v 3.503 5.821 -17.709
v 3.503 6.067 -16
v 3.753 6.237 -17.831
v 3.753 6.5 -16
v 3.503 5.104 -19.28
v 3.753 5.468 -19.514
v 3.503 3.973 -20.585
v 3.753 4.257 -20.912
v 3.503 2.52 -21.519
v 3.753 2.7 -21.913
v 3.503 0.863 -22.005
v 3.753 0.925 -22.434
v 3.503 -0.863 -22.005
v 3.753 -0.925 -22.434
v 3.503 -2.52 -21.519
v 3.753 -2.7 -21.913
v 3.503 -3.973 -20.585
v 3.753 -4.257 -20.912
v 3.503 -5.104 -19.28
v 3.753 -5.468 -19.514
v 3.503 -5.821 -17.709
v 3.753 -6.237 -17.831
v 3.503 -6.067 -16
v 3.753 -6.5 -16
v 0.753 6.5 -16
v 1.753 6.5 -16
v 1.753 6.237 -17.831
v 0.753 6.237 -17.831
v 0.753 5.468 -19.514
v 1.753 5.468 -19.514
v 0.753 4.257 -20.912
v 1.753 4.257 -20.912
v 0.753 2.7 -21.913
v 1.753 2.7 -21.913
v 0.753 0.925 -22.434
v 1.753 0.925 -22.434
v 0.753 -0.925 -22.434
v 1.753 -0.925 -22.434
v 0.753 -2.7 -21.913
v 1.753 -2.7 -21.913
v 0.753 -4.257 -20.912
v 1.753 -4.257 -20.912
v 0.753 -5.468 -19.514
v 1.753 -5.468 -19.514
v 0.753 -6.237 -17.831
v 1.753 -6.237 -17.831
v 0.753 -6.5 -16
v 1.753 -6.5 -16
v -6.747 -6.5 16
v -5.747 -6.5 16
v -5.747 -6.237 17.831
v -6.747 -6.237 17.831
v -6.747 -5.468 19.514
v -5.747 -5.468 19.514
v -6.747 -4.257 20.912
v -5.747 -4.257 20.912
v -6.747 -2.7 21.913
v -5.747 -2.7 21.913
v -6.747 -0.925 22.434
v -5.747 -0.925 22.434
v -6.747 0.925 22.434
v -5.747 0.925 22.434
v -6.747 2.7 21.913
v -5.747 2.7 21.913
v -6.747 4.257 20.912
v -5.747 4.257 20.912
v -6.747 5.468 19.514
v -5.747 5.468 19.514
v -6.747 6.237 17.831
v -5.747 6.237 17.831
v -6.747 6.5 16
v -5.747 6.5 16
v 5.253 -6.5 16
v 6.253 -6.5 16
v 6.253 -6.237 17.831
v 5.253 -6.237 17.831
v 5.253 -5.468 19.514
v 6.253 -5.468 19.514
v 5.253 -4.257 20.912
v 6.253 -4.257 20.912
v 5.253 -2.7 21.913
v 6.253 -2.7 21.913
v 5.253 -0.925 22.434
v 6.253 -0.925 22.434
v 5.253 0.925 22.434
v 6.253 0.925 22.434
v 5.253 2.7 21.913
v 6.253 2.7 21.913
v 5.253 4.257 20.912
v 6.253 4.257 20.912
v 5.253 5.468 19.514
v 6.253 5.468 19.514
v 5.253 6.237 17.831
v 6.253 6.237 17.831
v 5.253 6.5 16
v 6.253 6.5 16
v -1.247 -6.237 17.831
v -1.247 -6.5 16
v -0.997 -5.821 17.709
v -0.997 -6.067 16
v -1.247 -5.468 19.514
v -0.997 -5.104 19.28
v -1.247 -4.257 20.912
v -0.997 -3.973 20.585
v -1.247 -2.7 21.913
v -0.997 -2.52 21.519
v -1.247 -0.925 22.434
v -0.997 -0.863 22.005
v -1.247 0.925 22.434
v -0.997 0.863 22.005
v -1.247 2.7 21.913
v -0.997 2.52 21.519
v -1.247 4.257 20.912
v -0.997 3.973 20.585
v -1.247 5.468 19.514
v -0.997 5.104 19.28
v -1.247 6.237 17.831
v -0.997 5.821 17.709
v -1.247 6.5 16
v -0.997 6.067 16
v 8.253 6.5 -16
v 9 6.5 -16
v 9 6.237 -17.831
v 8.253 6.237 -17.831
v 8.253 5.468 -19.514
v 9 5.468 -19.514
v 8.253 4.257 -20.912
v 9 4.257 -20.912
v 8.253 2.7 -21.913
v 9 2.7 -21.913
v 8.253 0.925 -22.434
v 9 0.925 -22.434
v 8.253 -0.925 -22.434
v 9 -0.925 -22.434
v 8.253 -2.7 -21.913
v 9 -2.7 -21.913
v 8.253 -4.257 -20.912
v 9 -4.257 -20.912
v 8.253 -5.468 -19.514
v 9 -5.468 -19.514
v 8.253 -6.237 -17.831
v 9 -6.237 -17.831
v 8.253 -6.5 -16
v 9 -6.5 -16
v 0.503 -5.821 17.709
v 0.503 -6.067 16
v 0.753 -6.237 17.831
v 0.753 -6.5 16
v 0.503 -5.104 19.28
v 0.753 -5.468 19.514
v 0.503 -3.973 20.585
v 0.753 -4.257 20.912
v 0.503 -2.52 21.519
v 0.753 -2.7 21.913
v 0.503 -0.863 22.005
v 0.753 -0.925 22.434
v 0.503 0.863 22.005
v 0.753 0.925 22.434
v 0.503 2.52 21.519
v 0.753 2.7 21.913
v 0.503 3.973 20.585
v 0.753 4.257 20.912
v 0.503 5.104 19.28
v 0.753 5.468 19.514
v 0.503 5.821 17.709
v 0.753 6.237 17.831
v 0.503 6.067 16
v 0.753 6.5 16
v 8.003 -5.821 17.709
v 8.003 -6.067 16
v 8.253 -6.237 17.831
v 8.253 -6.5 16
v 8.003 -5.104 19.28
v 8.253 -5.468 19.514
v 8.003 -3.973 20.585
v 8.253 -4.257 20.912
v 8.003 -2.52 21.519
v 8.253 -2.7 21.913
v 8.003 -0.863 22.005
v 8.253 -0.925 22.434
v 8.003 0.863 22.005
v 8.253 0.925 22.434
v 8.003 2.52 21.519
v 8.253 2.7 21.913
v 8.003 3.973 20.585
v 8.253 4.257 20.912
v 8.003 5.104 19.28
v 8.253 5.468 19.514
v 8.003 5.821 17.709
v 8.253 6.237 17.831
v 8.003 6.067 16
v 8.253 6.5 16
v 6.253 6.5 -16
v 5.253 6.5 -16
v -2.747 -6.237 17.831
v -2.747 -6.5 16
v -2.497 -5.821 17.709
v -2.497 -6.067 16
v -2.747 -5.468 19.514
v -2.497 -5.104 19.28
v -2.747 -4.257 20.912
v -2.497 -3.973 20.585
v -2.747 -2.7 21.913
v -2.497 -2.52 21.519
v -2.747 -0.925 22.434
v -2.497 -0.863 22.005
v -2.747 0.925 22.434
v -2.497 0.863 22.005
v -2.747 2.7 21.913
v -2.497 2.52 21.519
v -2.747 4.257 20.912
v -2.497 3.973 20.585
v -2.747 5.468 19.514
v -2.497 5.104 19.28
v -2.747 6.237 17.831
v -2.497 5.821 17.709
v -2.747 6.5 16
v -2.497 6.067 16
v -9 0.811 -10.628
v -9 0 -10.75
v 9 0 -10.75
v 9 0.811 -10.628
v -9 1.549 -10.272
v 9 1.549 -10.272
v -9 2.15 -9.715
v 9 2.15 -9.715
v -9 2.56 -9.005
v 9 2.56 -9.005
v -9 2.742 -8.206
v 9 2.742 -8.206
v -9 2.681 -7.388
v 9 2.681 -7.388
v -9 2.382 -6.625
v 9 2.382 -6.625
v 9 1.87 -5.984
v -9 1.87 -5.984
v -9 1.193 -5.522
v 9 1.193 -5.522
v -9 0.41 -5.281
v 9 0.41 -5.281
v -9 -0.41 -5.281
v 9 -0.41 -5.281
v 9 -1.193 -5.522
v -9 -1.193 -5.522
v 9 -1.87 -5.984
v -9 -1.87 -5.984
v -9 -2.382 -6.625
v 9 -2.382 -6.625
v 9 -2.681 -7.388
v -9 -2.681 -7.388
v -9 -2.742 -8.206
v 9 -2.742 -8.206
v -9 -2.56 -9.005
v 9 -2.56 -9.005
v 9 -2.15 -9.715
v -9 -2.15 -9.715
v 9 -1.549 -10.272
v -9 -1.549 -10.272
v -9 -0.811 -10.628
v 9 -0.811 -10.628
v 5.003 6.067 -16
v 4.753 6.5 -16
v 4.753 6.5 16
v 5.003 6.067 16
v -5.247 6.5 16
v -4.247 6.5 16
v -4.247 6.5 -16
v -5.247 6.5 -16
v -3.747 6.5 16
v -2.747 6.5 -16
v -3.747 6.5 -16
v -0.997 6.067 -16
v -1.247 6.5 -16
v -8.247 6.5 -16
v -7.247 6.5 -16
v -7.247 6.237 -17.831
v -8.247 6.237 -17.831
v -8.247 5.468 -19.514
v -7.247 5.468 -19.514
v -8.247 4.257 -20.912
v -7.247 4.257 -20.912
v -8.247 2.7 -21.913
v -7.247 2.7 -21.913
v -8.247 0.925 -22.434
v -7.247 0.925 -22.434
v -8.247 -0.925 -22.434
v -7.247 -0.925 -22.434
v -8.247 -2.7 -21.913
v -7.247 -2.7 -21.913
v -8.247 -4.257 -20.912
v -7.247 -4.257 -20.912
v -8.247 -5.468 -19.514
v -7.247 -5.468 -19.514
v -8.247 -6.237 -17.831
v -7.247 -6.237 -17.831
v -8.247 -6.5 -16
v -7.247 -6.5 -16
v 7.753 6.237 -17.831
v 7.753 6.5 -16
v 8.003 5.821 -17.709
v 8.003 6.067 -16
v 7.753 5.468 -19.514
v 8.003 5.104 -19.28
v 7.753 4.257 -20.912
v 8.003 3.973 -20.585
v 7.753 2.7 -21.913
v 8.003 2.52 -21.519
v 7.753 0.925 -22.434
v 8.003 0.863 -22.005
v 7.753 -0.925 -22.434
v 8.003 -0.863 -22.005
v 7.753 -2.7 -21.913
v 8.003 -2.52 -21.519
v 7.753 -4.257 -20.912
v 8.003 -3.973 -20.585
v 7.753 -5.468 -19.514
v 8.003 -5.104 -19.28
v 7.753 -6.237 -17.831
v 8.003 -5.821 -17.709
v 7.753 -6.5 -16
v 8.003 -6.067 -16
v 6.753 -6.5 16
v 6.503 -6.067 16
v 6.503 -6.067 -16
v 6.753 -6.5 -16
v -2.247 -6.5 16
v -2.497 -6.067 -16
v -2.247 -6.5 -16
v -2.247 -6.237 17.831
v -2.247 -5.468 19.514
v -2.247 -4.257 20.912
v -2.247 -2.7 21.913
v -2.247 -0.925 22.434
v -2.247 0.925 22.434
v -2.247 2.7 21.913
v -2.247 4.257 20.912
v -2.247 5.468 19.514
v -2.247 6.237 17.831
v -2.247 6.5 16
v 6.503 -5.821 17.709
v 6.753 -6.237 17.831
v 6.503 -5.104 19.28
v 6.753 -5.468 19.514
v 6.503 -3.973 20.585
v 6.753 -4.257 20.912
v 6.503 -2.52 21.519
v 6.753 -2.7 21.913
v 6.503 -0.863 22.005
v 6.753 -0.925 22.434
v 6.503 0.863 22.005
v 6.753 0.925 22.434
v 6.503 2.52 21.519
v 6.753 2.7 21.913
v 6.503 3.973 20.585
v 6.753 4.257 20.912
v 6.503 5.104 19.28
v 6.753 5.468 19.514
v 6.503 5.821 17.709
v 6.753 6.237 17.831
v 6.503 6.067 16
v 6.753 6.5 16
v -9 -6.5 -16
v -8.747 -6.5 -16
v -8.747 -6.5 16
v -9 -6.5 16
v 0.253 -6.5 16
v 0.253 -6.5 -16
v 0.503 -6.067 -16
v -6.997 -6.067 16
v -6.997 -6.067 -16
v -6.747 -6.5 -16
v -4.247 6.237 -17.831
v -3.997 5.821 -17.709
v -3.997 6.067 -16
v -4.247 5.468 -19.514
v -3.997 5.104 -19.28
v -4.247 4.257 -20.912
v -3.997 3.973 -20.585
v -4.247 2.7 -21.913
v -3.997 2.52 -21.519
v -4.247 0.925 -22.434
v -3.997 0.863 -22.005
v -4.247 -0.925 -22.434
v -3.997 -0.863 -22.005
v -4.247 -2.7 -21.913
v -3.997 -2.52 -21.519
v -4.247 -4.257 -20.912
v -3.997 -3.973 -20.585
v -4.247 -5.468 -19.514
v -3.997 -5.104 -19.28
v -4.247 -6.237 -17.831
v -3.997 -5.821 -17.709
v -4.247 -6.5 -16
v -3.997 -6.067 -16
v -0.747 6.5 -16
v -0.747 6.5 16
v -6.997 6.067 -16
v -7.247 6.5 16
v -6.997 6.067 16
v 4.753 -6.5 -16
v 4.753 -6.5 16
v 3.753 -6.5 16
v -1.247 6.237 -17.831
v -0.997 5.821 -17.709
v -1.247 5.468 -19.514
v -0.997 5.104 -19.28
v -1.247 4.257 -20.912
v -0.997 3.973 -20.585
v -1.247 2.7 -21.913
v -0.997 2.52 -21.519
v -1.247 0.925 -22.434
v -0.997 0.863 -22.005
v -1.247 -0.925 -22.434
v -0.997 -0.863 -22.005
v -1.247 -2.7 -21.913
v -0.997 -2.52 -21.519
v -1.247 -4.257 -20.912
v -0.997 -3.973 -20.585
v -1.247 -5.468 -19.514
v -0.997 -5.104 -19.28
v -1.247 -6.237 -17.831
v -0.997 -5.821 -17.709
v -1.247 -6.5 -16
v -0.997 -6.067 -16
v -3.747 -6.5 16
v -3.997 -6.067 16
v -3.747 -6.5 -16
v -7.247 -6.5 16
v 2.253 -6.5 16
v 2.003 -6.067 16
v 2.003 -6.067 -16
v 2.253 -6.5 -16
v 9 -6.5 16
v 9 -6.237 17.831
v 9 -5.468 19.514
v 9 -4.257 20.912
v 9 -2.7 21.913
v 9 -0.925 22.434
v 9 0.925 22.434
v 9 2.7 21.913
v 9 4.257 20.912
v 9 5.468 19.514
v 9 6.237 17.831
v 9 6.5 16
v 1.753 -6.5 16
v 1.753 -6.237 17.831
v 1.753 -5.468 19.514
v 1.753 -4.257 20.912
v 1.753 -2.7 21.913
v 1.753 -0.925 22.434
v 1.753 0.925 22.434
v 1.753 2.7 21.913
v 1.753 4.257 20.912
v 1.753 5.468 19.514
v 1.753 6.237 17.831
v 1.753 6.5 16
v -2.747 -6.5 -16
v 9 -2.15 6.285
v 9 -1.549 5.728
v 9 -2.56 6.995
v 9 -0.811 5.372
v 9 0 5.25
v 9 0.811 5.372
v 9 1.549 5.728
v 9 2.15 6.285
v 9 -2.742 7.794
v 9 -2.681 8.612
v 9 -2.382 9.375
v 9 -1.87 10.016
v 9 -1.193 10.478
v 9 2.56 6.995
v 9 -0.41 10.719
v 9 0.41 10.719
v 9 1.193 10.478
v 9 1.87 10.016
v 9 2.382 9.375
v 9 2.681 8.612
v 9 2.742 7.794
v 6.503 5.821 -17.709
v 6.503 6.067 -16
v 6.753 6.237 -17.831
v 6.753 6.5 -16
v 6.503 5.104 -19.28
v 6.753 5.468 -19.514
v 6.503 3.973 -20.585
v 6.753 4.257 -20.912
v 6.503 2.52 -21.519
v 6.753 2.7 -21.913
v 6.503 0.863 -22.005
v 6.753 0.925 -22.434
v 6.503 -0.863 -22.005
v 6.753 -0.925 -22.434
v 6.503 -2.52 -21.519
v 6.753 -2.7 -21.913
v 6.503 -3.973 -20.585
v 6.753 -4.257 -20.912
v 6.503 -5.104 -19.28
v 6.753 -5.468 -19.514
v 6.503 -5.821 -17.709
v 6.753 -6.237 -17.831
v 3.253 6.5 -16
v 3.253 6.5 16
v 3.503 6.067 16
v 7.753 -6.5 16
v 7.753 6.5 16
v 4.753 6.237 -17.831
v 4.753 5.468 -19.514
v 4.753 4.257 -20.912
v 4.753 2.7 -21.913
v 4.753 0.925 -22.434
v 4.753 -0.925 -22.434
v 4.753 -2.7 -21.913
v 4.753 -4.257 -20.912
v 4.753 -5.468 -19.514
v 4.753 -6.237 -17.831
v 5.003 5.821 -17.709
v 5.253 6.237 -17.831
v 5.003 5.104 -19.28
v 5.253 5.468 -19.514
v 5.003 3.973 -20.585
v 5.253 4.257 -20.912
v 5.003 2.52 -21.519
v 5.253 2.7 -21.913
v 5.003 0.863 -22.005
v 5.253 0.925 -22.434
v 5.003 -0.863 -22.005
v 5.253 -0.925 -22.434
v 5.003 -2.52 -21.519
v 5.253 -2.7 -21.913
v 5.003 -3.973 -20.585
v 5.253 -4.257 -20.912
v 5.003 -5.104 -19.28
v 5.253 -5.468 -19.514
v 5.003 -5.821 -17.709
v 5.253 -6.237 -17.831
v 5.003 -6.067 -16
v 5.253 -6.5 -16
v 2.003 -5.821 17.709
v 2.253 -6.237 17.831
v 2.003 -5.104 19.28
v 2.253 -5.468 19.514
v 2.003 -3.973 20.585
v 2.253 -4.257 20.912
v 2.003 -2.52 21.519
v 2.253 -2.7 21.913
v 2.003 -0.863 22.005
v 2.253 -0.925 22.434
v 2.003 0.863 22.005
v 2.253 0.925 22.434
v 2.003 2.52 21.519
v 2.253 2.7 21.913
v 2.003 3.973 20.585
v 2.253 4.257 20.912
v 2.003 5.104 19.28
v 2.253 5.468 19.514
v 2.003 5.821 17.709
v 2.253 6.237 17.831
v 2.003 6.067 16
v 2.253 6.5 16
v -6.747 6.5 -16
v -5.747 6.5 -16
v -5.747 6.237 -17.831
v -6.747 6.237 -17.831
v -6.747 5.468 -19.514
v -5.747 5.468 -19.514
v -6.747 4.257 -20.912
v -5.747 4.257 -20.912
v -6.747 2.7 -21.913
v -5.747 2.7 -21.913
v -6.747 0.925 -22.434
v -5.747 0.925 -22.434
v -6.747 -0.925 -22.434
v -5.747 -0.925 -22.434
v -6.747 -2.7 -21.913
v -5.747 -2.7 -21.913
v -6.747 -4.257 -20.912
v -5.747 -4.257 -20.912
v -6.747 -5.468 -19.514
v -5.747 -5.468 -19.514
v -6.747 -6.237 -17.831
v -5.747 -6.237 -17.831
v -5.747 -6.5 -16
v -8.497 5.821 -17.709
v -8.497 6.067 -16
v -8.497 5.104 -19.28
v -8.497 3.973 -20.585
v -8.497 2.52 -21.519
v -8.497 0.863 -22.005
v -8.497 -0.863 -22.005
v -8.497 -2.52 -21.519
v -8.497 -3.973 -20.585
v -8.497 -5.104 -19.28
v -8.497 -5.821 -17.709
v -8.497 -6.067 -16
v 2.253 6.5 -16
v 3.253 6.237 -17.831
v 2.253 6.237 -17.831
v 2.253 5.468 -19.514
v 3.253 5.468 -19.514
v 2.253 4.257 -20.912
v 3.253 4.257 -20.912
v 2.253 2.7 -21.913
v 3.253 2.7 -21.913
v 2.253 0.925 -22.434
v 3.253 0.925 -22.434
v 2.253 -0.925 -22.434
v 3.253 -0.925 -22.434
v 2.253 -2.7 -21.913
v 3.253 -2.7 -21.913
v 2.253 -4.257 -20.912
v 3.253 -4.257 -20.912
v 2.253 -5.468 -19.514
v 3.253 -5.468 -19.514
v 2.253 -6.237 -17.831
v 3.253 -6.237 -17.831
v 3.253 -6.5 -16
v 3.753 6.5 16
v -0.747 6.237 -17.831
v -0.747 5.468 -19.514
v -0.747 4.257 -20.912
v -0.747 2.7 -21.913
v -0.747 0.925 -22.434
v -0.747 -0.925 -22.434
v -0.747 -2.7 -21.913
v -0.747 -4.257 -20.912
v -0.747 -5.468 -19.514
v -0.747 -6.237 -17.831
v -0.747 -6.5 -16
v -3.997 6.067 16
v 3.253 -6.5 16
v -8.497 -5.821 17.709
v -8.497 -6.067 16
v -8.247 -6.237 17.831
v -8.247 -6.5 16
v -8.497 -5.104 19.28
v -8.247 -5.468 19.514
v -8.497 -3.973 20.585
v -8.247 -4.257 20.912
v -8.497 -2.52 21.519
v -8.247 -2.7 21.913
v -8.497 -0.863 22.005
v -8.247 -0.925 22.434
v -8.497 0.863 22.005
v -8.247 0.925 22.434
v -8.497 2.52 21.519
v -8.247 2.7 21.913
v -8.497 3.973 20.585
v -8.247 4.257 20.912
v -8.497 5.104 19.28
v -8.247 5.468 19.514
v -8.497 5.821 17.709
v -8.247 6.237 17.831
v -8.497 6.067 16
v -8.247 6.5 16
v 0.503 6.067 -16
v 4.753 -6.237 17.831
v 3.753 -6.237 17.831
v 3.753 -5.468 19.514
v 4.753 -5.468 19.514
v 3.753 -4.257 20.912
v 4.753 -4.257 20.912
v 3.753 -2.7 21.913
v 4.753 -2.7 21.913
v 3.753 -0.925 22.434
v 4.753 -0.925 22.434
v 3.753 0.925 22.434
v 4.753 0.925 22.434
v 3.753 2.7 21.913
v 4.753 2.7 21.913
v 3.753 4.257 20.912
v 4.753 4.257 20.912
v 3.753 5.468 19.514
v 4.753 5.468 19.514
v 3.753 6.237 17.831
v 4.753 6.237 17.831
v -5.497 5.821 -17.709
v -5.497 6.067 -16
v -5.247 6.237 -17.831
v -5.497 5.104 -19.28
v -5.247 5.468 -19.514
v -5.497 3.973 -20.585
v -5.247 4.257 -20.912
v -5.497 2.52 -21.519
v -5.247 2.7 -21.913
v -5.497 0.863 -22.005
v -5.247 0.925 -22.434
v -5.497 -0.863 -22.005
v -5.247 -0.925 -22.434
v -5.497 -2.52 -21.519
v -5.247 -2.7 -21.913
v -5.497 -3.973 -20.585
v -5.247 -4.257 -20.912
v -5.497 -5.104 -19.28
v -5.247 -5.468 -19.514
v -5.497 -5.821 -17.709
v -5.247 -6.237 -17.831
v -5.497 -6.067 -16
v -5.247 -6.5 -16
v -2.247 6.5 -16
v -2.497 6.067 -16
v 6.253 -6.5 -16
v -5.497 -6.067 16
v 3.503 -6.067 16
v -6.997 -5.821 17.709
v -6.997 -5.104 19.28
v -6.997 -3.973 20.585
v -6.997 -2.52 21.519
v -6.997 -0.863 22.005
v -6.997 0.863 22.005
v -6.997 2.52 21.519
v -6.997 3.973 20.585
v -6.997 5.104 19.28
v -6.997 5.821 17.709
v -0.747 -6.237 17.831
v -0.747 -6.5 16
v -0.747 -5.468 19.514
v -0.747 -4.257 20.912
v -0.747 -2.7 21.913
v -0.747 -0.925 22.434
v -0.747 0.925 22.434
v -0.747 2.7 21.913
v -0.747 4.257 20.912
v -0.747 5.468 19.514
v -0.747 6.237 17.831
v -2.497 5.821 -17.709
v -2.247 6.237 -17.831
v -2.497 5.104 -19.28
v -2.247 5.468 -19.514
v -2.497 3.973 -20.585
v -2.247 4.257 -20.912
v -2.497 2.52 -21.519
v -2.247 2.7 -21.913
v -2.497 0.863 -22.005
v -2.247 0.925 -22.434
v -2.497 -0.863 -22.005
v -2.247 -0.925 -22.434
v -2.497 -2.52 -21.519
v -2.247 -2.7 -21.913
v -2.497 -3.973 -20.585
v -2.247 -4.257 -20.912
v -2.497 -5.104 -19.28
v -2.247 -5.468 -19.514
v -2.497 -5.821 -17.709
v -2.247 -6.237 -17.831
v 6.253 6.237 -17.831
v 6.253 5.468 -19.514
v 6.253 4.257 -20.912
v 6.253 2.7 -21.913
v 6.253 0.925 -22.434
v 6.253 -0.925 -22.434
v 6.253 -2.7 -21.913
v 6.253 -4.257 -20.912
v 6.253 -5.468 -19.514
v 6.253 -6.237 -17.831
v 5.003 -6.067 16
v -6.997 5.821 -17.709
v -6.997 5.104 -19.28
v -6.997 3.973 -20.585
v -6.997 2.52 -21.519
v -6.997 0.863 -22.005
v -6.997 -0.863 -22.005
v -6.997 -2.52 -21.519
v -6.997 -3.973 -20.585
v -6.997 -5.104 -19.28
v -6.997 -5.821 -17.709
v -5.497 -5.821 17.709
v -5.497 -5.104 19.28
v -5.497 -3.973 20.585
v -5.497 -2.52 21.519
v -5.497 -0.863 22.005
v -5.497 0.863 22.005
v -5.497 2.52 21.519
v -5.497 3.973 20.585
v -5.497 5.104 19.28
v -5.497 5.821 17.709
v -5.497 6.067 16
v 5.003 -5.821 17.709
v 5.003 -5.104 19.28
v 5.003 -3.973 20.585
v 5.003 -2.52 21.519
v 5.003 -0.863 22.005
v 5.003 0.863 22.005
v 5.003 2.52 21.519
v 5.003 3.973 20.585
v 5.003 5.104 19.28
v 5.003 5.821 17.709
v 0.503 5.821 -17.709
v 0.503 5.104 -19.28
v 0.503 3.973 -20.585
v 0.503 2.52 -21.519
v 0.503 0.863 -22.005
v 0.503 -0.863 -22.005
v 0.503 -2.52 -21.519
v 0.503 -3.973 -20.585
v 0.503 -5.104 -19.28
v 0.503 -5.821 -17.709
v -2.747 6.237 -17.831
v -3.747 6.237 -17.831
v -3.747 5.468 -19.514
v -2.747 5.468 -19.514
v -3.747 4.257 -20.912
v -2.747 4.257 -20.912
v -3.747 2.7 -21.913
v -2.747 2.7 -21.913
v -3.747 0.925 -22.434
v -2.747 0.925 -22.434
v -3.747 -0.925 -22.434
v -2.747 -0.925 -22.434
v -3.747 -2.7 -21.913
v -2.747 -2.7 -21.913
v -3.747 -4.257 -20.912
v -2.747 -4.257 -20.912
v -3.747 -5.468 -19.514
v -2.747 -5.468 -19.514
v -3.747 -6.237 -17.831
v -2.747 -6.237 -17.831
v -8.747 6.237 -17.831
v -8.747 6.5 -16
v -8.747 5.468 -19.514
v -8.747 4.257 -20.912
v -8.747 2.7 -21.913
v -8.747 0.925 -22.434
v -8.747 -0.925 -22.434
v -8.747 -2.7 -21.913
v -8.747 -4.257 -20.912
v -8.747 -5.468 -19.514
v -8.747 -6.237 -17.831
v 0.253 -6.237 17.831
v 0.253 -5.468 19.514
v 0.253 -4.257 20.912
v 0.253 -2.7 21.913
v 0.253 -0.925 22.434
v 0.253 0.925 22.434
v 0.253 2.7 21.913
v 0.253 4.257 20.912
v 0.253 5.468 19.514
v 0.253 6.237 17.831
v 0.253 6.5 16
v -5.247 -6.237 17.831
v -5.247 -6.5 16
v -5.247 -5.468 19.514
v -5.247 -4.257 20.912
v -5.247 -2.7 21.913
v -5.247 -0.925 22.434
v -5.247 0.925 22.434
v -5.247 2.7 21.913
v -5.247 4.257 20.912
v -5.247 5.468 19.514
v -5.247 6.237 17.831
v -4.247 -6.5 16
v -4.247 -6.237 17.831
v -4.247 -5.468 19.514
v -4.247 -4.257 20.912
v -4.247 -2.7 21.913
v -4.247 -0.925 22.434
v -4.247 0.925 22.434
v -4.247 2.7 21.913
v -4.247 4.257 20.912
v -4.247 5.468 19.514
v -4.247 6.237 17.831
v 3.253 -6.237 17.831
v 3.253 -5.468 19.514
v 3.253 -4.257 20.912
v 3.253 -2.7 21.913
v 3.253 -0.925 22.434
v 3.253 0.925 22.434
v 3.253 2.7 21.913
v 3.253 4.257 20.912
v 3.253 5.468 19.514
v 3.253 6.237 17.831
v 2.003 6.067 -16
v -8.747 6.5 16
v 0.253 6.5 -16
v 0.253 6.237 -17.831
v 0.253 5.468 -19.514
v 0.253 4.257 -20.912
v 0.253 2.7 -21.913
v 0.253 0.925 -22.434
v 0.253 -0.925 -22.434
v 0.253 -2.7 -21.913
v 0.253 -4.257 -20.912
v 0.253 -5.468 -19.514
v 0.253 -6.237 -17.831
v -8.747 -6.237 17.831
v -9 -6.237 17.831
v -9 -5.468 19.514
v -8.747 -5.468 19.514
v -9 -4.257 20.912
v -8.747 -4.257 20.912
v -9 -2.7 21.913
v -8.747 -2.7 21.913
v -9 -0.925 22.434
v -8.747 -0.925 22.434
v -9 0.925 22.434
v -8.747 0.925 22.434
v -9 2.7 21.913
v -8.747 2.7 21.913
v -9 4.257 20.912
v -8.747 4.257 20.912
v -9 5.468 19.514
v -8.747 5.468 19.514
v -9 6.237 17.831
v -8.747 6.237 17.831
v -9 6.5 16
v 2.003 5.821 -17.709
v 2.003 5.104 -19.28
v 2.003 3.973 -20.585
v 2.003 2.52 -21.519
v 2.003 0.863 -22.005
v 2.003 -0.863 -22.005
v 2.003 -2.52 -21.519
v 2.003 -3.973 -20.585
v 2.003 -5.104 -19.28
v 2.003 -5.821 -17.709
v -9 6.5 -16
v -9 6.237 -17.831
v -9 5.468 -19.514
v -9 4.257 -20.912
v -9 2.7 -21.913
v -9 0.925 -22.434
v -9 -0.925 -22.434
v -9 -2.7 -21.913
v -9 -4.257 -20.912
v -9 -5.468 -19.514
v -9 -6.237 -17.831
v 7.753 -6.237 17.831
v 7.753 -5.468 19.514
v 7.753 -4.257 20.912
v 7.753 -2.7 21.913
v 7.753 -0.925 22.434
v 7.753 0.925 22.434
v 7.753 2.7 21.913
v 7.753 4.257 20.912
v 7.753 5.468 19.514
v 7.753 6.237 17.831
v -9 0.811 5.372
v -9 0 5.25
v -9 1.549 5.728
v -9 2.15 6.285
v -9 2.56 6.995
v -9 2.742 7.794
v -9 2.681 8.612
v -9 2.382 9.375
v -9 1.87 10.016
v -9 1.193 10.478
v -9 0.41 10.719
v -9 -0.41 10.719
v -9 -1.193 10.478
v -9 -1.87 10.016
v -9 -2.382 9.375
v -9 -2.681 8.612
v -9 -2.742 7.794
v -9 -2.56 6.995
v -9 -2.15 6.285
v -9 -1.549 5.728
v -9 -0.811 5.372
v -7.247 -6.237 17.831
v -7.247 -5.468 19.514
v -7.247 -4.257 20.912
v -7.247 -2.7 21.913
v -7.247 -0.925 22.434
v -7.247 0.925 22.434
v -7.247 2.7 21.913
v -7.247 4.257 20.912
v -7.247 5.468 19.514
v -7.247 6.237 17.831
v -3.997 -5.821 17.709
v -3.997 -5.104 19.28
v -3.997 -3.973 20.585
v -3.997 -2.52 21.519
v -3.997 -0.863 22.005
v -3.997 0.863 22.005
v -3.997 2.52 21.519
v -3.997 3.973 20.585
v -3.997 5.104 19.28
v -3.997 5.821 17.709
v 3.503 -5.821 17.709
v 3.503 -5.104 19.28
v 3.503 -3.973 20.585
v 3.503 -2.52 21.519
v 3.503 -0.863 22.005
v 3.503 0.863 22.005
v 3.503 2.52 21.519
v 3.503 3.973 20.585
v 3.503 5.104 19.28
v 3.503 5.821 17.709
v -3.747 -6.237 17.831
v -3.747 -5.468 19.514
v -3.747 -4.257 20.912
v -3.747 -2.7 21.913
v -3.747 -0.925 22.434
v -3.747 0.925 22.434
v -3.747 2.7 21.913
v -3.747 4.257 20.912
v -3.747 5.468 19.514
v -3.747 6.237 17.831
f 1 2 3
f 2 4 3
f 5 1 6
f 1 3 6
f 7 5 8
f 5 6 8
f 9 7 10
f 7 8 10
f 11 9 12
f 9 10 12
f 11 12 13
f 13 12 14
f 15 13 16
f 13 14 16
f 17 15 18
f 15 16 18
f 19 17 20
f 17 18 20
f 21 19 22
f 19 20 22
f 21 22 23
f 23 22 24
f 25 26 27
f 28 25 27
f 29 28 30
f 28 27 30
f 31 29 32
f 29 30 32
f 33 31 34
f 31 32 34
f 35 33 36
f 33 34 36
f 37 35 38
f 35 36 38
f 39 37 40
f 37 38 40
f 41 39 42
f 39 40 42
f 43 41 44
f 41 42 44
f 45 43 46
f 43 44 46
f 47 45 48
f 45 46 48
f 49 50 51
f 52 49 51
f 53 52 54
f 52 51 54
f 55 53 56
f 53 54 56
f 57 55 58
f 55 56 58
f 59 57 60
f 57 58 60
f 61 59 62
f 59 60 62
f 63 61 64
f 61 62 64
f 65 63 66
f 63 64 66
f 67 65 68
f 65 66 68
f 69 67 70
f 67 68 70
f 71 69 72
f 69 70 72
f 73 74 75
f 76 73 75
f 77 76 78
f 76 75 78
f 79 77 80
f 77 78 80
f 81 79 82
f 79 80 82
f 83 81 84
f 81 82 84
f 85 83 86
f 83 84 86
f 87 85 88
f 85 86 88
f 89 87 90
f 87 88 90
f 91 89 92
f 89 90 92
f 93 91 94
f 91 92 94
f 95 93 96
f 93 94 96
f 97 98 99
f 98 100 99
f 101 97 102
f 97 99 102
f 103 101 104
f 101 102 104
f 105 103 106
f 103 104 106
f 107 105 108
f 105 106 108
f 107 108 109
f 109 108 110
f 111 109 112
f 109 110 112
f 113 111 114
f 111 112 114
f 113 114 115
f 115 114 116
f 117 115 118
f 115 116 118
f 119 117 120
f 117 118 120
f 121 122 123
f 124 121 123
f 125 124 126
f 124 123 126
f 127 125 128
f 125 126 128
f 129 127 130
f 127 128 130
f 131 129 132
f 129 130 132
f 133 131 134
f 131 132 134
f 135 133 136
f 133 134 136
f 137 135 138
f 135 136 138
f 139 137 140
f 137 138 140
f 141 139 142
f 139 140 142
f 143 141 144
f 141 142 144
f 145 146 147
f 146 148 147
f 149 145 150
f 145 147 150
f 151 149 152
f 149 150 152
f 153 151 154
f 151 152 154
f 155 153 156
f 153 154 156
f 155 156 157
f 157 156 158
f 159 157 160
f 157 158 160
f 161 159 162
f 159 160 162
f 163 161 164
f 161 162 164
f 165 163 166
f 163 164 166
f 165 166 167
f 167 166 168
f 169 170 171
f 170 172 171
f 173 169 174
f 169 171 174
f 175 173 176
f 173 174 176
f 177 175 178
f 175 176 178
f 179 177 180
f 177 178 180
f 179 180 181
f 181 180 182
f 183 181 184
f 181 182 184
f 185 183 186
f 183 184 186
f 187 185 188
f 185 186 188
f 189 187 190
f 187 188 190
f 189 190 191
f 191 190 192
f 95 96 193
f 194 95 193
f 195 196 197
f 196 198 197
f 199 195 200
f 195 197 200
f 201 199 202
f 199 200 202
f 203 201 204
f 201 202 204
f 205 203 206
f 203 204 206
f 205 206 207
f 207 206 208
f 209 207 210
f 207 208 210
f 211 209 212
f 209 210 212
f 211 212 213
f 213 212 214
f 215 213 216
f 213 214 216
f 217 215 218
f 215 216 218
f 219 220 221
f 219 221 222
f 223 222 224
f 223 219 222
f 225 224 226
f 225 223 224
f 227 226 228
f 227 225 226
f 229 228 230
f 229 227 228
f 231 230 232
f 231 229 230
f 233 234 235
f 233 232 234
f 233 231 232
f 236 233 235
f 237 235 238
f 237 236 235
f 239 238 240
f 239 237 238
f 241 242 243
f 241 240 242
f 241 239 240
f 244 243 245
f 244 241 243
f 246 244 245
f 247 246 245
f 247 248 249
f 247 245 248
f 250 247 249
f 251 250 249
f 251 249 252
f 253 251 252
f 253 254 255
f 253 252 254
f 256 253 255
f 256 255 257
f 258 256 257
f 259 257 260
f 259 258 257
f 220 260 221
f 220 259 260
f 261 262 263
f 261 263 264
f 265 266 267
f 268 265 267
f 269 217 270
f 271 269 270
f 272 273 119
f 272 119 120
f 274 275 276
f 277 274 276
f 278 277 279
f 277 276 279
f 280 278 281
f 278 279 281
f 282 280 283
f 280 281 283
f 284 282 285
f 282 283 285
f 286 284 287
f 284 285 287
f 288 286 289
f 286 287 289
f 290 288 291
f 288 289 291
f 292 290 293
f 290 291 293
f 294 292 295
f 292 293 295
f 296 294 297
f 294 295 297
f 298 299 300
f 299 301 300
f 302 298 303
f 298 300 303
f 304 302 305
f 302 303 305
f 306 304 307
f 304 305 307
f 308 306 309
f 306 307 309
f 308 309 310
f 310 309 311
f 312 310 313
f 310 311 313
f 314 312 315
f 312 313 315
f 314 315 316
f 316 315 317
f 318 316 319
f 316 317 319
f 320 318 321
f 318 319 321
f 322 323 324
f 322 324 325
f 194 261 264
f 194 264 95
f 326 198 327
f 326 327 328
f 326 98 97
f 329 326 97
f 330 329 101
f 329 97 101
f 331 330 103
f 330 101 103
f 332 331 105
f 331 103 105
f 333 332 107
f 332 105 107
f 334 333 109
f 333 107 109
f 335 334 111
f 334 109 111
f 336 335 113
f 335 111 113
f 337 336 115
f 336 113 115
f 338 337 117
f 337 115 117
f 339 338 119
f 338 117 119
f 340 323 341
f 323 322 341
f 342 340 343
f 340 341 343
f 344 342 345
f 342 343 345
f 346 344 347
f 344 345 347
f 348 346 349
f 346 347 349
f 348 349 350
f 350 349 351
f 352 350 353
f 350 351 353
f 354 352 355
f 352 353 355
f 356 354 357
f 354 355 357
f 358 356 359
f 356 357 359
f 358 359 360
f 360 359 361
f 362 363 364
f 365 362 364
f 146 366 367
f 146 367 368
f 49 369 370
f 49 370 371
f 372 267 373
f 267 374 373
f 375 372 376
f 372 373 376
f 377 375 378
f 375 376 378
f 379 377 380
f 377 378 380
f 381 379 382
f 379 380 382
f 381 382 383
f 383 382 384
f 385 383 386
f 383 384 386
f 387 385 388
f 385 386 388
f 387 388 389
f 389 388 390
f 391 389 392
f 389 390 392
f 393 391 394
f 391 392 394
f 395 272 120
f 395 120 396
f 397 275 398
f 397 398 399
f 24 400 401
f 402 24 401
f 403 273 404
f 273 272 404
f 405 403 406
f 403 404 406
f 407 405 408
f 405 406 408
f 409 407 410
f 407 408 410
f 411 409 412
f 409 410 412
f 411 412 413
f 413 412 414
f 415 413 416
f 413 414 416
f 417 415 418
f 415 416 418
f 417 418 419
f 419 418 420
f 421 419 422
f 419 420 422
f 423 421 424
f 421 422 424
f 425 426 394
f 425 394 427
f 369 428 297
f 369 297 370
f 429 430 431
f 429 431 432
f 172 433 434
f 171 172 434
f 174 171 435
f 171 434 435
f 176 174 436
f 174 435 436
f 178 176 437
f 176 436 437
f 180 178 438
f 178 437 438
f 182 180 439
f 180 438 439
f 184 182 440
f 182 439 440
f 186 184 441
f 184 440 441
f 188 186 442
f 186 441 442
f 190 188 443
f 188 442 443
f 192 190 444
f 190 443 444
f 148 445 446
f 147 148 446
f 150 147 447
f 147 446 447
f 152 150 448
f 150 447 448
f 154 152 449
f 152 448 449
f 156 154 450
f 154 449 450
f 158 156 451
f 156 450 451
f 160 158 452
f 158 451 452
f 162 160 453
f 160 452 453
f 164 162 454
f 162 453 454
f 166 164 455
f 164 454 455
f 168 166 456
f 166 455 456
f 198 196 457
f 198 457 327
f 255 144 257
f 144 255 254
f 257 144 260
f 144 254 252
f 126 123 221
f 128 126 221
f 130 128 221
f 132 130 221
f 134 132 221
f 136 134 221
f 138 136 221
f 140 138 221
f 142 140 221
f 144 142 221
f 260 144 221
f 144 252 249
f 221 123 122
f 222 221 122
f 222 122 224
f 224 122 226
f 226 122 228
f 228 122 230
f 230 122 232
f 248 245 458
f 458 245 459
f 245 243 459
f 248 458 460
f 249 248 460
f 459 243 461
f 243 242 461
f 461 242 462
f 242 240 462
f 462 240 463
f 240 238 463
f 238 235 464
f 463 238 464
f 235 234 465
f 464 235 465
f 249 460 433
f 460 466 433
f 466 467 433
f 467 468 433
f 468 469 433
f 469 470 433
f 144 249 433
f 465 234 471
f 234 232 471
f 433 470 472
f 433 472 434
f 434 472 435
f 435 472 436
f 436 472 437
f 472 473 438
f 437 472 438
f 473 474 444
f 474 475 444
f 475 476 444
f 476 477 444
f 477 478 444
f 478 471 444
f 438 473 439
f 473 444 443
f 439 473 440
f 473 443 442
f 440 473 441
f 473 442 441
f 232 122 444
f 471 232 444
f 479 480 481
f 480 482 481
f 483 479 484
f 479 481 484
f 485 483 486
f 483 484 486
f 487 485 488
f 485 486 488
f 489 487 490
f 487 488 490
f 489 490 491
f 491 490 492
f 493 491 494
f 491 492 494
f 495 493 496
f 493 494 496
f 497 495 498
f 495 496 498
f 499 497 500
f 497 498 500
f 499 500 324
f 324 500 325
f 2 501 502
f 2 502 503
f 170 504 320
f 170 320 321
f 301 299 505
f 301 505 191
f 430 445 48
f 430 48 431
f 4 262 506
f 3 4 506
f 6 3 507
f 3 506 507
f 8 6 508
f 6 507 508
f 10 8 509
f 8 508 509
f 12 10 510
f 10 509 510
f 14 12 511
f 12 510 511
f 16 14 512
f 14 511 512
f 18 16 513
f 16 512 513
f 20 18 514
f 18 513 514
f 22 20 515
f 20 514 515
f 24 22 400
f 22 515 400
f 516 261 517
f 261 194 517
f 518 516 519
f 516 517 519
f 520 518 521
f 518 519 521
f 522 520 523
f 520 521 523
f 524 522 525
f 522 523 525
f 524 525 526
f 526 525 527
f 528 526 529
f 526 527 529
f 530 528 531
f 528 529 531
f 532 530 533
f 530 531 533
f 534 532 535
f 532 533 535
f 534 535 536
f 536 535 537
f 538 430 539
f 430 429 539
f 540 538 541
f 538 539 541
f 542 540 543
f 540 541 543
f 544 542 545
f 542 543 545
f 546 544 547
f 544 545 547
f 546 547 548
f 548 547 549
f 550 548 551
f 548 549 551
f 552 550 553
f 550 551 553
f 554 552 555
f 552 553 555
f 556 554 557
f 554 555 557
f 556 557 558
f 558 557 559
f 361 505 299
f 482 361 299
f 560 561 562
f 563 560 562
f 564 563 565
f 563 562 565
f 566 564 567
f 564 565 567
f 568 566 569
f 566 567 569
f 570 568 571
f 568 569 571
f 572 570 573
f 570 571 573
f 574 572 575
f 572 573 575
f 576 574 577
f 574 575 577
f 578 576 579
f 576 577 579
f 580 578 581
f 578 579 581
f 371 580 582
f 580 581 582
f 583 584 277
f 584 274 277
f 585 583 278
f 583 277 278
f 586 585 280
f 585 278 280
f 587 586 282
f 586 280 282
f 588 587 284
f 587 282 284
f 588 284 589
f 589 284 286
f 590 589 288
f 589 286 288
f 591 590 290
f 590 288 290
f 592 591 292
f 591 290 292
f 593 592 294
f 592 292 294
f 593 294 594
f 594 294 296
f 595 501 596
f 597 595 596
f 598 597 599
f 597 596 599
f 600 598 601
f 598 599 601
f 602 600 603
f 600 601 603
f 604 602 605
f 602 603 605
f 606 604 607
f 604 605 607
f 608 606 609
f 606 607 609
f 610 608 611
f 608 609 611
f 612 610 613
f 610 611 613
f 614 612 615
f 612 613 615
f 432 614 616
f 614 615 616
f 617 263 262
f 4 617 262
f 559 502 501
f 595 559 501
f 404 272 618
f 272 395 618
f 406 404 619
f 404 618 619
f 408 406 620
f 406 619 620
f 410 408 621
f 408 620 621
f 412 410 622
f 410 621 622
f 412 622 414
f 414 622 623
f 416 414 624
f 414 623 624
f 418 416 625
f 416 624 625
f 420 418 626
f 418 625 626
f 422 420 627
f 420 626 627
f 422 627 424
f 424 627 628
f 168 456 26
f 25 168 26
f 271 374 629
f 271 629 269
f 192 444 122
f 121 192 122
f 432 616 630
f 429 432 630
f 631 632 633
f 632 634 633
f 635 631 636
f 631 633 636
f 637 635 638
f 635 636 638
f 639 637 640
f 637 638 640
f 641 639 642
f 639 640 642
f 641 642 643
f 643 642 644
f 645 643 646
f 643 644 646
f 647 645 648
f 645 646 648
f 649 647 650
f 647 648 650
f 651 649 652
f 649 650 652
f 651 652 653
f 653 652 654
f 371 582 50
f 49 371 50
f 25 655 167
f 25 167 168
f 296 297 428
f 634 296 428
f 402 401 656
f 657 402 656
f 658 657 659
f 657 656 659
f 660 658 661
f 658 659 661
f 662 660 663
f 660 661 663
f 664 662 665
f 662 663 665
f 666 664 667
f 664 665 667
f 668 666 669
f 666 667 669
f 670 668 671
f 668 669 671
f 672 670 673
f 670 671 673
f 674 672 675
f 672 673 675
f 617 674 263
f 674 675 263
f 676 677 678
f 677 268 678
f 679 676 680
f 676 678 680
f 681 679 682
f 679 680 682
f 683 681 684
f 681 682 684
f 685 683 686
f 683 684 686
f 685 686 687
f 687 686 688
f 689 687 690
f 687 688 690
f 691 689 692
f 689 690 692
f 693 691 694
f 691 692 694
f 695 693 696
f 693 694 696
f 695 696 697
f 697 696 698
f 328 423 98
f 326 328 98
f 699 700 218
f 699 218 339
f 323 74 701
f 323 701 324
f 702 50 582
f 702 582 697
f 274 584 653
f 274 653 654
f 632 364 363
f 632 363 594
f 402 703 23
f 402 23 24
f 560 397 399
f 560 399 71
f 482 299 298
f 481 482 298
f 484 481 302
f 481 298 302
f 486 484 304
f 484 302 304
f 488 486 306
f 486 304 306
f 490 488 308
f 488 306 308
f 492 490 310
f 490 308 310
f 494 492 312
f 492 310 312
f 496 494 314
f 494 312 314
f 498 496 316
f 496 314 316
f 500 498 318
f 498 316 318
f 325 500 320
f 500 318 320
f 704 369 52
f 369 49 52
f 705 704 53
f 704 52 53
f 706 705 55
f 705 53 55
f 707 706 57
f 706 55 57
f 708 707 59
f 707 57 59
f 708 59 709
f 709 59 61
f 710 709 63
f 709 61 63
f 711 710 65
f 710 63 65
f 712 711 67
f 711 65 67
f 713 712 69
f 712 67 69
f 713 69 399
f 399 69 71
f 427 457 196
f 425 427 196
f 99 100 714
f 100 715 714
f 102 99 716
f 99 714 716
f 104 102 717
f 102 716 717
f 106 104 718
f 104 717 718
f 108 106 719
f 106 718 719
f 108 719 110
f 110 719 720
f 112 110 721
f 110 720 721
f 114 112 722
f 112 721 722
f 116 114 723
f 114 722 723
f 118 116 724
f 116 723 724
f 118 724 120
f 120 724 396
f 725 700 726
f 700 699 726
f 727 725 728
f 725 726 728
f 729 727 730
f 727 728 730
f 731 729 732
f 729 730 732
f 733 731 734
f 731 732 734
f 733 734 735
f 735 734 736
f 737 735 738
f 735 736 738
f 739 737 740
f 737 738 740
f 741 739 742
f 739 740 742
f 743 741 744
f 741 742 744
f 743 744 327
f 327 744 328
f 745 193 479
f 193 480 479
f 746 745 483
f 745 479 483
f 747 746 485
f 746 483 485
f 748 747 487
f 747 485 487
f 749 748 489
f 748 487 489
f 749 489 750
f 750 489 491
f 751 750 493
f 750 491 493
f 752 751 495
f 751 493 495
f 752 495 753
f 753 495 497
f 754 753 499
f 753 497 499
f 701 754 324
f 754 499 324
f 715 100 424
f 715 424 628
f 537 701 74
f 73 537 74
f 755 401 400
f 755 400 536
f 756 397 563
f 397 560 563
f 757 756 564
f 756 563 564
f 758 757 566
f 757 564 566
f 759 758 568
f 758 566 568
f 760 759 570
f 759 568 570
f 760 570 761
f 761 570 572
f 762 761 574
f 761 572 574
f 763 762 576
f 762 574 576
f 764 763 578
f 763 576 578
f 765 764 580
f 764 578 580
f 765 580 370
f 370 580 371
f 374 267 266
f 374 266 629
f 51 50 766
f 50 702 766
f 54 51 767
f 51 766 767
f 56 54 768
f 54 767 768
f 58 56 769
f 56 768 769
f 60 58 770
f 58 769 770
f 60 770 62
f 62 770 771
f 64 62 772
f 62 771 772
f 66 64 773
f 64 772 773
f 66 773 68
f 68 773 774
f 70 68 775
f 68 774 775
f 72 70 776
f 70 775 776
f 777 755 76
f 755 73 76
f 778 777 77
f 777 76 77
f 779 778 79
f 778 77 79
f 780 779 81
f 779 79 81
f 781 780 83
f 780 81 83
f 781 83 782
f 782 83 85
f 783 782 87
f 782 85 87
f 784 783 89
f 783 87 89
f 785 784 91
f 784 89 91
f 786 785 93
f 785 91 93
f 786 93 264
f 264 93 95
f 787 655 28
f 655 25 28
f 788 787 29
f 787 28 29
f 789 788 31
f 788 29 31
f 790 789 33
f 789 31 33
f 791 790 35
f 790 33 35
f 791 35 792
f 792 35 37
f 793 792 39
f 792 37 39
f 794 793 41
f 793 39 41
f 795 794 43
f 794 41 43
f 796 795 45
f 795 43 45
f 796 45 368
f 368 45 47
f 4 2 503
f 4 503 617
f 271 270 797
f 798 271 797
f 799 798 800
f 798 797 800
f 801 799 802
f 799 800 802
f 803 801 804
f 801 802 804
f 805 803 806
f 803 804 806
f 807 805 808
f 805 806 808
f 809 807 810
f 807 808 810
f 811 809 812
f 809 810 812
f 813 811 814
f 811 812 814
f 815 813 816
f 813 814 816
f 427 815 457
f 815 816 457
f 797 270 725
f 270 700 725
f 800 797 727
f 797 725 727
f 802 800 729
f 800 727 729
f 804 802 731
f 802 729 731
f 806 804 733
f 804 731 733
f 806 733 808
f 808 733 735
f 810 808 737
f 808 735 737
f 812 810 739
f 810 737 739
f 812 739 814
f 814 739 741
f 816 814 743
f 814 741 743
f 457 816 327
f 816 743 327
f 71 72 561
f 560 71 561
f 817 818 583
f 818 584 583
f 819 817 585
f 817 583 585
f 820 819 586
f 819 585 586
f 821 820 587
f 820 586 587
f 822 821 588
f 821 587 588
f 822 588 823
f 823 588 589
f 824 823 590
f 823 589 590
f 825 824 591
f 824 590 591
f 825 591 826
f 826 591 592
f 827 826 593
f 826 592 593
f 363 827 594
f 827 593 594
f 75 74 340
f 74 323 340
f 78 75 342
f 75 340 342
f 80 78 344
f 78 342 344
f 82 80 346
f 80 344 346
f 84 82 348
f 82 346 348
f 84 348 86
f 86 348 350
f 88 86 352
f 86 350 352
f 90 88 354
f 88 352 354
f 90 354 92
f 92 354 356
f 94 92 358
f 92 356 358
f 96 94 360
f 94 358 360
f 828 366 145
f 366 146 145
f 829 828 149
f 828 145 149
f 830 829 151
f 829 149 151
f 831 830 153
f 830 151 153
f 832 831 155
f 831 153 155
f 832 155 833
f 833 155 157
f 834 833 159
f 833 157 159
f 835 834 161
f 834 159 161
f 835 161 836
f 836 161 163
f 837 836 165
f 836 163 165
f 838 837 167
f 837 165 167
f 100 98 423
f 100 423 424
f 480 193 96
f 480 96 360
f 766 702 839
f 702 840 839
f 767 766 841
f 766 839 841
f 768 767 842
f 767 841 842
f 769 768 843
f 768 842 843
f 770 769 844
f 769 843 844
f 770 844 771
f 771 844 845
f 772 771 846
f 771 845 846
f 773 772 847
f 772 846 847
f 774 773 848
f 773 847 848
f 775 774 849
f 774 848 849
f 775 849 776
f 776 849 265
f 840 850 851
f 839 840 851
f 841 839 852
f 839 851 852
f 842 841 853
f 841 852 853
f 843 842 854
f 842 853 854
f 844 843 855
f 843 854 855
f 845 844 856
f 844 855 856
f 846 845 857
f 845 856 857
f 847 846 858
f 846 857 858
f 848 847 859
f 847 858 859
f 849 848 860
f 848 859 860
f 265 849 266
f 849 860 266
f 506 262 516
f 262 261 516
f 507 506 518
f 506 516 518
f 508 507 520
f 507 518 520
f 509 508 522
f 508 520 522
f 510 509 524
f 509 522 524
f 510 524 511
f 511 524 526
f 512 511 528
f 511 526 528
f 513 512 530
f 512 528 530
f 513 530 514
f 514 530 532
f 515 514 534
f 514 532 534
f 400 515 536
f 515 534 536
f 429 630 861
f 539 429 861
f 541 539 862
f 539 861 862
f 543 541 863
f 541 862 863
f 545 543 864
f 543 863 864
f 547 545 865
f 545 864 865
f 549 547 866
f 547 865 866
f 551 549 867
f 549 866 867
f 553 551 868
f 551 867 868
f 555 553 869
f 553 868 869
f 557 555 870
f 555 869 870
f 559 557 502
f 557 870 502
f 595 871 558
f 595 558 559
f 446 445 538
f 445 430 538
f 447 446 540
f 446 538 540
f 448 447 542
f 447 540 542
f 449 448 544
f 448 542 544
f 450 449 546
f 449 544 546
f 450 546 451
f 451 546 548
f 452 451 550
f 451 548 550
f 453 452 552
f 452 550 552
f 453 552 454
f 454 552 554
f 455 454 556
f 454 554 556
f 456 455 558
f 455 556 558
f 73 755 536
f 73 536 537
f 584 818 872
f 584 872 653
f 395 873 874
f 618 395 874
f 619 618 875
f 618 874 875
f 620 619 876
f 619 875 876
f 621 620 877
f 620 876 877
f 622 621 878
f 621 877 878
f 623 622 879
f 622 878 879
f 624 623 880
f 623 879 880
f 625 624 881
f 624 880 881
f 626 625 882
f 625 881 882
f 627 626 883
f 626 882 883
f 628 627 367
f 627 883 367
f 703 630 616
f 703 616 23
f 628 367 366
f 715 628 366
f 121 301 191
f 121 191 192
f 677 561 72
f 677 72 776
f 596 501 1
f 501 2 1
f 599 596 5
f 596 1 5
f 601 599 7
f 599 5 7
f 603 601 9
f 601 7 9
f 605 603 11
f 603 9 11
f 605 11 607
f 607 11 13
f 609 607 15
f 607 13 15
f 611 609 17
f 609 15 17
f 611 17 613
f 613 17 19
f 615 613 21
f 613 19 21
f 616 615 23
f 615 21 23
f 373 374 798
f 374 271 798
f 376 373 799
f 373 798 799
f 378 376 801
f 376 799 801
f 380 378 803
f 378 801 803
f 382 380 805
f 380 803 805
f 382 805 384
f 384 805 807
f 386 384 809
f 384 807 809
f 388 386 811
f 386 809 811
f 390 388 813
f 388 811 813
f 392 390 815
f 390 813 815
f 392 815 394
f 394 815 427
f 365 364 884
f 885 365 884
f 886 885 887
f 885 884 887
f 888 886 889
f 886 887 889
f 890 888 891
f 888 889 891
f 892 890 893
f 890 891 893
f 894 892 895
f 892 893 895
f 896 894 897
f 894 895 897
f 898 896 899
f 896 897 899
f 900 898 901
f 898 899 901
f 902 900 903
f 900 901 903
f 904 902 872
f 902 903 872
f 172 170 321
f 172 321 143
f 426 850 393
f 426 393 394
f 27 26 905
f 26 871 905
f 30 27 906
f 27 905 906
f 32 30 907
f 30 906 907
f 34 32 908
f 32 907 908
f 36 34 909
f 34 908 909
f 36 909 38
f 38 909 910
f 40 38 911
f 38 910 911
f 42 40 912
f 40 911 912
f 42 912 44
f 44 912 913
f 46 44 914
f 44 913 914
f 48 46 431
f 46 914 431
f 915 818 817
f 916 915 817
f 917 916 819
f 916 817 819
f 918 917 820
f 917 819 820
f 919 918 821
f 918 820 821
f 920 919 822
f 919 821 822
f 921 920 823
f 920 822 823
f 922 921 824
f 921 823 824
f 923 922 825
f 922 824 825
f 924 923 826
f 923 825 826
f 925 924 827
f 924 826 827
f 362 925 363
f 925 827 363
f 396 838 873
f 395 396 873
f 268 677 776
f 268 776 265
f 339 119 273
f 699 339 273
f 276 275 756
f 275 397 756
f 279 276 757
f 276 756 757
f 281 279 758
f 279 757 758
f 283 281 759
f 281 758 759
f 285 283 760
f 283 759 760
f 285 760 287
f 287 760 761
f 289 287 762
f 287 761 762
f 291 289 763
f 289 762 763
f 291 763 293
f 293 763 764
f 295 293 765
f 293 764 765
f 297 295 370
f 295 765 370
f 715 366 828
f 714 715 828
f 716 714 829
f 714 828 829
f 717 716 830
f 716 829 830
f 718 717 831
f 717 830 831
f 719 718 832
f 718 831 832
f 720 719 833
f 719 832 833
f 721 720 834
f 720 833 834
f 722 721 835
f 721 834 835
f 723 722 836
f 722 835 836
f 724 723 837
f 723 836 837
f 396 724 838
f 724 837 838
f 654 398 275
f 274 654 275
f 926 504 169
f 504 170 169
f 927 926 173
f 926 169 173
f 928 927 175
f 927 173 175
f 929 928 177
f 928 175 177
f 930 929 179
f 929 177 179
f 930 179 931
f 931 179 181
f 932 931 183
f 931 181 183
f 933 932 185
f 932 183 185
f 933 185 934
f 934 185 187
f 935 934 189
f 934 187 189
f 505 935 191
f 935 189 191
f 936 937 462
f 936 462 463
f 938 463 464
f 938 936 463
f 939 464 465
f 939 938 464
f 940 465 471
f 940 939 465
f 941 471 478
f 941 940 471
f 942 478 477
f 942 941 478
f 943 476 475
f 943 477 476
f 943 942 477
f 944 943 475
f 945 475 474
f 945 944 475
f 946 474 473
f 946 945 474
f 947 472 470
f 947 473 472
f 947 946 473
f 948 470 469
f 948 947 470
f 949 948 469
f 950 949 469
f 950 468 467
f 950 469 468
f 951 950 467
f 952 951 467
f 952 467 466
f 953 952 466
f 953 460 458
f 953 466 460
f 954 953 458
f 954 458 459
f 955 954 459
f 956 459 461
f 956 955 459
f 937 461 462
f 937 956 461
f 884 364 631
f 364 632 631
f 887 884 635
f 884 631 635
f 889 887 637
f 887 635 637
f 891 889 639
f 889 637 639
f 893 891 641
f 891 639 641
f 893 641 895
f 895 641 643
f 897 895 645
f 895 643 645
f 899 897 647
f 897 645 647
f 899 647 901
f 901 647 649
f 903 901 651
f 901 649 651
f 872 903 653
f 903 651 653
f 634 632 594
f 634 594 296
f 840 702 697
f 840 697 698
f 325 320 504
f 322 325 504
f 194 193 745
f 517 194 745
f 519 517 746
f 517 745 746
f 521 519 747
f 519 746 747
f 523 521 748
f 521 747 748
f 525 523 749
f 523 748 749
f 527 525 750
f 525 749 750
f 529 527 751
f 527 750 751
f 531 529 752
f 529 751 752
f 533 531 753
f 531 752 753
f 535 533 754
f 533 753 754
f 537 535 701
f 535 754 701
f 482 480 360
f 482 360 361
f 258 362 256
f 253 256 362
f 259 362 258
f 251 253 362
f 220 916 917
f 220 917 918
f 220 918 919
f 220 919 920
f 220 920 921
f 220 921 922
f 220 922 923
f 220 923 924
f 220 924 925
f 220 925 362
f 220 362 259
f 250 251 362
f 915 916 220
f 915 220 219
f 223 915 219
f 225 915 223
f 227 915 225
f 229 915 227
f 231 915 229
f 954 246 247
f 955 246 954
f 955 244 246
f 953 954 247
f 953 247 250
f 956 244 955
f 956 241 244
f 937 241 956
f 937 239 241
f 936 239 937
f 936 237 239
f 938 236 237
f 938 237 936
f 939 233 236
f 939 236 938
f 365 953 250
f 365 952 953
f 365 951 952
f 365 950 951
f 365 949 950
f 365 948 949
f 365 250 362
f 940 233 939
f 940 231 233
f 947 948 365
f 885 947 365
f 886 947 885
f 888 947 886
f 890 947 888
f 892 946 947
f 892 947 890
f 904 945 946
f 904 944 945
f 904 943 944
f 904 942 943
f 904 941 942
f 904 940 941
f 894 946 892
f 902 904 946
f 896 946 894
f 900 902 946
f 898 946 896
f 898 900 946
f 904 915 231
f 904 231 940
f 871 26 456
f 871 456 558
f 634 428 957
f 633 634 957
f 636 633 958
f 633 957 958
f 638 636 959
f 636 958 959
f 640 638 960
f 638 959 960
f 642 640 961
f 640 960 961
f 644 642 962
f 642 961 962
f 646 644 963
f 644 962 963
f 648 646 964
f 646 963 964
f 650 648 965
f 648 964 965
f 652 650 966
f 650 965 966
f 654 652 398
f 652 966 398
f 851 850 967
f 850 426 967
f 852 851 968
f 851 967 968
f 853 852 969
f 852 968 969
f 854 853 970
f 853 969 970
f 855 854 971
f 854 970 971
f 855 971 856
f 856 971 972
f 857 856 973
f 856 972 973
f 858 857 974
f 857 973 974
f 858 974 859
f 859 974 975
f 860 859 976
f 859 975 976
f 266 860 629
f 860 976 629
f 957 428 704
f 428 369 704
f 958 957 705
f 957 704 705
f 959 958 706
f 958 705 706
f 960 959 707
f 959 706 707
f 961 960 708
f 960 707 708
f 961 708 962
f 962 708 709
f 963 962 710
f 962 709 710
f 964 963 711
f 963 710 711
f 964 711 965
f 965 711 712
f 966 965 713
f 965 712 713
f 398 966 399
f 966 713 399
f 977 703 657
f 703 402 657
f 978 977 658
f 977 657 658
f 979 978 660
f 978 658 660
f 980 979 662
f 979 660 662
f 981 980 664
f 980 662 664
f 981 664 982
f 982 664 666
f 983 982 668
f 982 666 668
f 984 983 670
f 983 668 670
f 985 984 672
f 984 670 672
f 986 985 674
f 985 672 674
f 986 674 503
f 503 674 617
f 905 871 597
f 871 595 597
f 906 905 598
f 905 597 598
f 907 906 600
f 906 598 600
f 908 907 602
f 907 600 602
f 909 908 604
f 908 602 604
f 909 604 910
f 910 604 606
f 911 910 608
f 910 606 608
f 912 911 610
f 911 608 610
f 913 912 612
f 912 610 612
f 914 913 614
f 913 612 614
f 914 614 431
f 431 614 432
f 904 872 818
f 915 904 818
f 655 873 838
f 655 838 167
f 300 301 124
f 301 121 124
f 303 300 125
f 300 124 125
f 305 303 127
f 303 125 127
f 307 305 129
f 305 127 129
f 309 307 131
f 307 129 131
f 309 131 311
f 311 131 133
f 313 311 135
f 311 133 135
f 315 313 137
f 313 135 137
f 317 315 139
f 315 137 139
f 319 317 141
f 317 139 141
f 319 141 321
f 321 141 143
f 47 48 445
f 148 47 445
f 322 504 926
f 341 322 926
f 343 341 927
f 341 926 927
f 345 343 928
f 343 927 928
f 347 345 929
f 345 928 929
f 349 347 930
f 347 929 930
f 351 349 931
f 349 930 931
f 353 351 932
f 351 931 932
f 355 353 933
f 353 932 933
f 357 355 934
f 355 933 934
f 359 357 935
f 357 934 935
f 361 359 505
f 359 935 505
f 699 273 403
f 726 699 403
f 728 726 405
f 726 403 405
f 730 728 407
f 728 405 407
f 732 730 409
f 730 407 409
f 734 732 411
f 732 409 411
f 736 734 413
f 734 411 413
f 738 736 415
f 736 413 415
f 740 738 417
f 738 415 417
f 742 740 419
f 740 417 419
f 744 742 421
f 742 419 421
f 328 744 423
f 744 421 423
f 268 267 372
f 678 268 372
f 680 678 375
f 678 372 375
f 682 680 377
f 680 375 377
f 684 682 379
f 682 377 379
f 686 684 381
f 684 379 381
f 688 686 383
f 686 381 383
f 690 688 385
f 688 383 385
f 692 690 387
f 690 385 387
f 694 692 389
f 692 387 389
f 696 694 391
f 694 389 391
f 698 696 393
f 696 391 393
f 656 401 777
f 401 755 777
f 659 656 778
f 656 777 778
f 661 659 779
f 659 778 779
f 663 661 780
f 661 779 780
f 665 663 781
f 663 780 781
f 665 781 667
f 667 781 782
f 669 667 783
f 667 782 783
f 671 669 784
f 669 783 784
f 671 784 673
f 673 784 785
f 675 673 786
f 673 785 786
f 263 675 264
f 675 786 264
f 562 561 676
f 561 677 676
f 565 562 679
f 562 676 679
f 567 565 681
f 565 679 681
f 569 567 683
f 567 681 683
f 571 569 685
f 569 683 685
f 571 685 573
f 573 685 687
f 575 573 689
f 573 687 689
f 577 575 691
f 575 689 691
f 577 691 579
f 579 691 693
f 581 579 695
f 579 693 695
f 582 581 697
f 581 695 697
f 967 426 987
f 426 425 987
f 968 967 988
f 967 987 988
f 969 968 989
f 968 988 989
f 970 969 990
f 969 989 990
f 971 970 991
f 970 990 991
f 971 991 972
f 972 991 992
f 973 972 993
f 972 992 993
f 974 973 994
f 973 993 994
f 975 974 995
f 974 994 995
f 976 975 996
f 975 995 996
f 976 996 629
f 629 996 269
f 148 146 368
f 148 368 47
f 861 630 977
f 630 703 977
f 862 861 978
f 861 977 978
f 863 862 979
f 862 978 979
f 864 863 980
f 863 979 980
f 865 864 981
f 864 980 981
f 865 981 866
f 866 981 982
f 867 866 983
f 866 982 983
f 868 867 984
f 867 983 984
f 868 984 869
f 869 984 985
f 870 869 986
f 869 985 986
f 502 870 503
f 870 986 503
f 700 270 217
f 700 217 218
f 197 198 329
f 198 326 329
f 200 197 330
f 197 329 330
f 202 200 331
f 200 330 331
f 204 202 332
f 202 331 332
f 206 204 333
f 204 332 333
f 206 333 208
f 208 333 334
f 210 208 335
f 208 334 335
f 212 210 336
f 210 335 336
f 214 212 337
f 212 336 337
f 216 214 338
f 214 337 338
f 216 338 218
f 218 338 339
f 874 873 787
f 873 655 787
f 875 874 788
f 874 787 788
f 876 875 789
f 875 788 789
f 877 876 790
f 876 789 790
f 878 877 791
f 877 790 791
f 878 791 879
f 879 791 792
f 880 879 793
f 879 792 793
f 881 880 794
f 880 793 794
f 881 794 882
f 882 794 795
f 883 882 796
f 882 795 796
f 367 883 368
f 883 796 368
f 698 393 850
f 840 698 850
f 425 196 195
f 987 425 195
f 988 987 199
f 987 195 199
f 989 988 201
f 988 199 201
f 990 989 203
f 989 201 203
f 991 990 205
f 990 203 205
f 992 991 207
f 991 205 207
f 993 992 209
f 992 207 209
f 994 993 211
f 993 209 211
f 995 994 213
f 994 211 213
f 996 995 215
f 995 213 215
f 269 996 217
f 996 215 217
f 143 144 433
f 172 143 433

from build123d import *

# Parameters (mm, degrees)
BOSS_EXTRUDE1_DEPTH     = 9
LPATTERN1_COUNT         = 12
LPATTERN1_PITCH         = 1.5
CUT_EXTRUDE1_DEPTH      = 30.538110975
CUT_EXTRUDE1_DEPTH_BACK = 30.538110975
SKETCH5_R               = 2.75


with BuildPart() as part:
    # Sketch2 → Boss-Extrude1 (new, symmetric)
    with BuildSketch(Plane(origin=(0, 0, 0), x_dir=(0, 0, -1), z_dir=(1, 0, 0))):
        with BuildLine():
            Line((16, -6.5), (-16, -6.5))
            ThreePointArc((-16, -6.5), (-22.5, 0), (-16, 6.5))
            Line((-16, 6.5), (16, 6.5))
            ThreePointArc((16, 6.5), (22.5, 0), (16, -6.5))
        make_face()
    extrude(amount=BOSS_EXTRUDE1_DEPTH, both=True)

    # Cut-Sweep1: sweep along a path in Sketch4
    with BuildLine(Plane.ZY.offset(9)) as cut_sweep1_path:
        Line((-16, -6.5), (16, -6.5))
        ThreePointArc((16, -6.5), (22.5, 0), (16, 6.5))
        Line((16, 6.5), (-16, 6.5))
        ThreePointArc((-16, 6.5), (-22.5, 0), (-16, -6.5))
    # Sketch3 → Cut-Sweep1 (sweep, cut)
    with BuildSketch(Plane.XY):
        Polygon((-8.747493318, 6.5), (-8.497493318, 6.066987298), (-8.247493318, 6.5), align=None)
    cut_sweep1 = sweep(path=cut_sweep1_path.line, mode=Mode.SUBTRACT)

    # LPattern1: Cut-Sweep1 ×12
    with Locations(*[(i * LPATTERN1_PITCH, 0, 0) for i in range(1, LPATTERN1_COUNT)]):
        add(cut_sweep1, mode=Mode.SUBTRACT)

    # Sketch5 → Cut-Extrude1 (cut, two sides: drawn at the far end of the back side and taken through both)
    with BuildSketch(Plane(origin=(9, 0, 0), x_dir=(0, 0, -1), z_dir=(1, 0, 0)).offset(-CUT_EXTRUDE1_DEPTH_BACK)):
        with Locations((-8, 0)):
            Circle(SKETCH5_R)
        with Locations((8, 0)):
            Circle(SKETCH5_R)
    extrude(amount=CUT_EXTRUDE1_DEPTH + CUT_EXTRUDE1_DEPTH_BACK, mode=Mode.SUBTRACT)


solid = part.part
